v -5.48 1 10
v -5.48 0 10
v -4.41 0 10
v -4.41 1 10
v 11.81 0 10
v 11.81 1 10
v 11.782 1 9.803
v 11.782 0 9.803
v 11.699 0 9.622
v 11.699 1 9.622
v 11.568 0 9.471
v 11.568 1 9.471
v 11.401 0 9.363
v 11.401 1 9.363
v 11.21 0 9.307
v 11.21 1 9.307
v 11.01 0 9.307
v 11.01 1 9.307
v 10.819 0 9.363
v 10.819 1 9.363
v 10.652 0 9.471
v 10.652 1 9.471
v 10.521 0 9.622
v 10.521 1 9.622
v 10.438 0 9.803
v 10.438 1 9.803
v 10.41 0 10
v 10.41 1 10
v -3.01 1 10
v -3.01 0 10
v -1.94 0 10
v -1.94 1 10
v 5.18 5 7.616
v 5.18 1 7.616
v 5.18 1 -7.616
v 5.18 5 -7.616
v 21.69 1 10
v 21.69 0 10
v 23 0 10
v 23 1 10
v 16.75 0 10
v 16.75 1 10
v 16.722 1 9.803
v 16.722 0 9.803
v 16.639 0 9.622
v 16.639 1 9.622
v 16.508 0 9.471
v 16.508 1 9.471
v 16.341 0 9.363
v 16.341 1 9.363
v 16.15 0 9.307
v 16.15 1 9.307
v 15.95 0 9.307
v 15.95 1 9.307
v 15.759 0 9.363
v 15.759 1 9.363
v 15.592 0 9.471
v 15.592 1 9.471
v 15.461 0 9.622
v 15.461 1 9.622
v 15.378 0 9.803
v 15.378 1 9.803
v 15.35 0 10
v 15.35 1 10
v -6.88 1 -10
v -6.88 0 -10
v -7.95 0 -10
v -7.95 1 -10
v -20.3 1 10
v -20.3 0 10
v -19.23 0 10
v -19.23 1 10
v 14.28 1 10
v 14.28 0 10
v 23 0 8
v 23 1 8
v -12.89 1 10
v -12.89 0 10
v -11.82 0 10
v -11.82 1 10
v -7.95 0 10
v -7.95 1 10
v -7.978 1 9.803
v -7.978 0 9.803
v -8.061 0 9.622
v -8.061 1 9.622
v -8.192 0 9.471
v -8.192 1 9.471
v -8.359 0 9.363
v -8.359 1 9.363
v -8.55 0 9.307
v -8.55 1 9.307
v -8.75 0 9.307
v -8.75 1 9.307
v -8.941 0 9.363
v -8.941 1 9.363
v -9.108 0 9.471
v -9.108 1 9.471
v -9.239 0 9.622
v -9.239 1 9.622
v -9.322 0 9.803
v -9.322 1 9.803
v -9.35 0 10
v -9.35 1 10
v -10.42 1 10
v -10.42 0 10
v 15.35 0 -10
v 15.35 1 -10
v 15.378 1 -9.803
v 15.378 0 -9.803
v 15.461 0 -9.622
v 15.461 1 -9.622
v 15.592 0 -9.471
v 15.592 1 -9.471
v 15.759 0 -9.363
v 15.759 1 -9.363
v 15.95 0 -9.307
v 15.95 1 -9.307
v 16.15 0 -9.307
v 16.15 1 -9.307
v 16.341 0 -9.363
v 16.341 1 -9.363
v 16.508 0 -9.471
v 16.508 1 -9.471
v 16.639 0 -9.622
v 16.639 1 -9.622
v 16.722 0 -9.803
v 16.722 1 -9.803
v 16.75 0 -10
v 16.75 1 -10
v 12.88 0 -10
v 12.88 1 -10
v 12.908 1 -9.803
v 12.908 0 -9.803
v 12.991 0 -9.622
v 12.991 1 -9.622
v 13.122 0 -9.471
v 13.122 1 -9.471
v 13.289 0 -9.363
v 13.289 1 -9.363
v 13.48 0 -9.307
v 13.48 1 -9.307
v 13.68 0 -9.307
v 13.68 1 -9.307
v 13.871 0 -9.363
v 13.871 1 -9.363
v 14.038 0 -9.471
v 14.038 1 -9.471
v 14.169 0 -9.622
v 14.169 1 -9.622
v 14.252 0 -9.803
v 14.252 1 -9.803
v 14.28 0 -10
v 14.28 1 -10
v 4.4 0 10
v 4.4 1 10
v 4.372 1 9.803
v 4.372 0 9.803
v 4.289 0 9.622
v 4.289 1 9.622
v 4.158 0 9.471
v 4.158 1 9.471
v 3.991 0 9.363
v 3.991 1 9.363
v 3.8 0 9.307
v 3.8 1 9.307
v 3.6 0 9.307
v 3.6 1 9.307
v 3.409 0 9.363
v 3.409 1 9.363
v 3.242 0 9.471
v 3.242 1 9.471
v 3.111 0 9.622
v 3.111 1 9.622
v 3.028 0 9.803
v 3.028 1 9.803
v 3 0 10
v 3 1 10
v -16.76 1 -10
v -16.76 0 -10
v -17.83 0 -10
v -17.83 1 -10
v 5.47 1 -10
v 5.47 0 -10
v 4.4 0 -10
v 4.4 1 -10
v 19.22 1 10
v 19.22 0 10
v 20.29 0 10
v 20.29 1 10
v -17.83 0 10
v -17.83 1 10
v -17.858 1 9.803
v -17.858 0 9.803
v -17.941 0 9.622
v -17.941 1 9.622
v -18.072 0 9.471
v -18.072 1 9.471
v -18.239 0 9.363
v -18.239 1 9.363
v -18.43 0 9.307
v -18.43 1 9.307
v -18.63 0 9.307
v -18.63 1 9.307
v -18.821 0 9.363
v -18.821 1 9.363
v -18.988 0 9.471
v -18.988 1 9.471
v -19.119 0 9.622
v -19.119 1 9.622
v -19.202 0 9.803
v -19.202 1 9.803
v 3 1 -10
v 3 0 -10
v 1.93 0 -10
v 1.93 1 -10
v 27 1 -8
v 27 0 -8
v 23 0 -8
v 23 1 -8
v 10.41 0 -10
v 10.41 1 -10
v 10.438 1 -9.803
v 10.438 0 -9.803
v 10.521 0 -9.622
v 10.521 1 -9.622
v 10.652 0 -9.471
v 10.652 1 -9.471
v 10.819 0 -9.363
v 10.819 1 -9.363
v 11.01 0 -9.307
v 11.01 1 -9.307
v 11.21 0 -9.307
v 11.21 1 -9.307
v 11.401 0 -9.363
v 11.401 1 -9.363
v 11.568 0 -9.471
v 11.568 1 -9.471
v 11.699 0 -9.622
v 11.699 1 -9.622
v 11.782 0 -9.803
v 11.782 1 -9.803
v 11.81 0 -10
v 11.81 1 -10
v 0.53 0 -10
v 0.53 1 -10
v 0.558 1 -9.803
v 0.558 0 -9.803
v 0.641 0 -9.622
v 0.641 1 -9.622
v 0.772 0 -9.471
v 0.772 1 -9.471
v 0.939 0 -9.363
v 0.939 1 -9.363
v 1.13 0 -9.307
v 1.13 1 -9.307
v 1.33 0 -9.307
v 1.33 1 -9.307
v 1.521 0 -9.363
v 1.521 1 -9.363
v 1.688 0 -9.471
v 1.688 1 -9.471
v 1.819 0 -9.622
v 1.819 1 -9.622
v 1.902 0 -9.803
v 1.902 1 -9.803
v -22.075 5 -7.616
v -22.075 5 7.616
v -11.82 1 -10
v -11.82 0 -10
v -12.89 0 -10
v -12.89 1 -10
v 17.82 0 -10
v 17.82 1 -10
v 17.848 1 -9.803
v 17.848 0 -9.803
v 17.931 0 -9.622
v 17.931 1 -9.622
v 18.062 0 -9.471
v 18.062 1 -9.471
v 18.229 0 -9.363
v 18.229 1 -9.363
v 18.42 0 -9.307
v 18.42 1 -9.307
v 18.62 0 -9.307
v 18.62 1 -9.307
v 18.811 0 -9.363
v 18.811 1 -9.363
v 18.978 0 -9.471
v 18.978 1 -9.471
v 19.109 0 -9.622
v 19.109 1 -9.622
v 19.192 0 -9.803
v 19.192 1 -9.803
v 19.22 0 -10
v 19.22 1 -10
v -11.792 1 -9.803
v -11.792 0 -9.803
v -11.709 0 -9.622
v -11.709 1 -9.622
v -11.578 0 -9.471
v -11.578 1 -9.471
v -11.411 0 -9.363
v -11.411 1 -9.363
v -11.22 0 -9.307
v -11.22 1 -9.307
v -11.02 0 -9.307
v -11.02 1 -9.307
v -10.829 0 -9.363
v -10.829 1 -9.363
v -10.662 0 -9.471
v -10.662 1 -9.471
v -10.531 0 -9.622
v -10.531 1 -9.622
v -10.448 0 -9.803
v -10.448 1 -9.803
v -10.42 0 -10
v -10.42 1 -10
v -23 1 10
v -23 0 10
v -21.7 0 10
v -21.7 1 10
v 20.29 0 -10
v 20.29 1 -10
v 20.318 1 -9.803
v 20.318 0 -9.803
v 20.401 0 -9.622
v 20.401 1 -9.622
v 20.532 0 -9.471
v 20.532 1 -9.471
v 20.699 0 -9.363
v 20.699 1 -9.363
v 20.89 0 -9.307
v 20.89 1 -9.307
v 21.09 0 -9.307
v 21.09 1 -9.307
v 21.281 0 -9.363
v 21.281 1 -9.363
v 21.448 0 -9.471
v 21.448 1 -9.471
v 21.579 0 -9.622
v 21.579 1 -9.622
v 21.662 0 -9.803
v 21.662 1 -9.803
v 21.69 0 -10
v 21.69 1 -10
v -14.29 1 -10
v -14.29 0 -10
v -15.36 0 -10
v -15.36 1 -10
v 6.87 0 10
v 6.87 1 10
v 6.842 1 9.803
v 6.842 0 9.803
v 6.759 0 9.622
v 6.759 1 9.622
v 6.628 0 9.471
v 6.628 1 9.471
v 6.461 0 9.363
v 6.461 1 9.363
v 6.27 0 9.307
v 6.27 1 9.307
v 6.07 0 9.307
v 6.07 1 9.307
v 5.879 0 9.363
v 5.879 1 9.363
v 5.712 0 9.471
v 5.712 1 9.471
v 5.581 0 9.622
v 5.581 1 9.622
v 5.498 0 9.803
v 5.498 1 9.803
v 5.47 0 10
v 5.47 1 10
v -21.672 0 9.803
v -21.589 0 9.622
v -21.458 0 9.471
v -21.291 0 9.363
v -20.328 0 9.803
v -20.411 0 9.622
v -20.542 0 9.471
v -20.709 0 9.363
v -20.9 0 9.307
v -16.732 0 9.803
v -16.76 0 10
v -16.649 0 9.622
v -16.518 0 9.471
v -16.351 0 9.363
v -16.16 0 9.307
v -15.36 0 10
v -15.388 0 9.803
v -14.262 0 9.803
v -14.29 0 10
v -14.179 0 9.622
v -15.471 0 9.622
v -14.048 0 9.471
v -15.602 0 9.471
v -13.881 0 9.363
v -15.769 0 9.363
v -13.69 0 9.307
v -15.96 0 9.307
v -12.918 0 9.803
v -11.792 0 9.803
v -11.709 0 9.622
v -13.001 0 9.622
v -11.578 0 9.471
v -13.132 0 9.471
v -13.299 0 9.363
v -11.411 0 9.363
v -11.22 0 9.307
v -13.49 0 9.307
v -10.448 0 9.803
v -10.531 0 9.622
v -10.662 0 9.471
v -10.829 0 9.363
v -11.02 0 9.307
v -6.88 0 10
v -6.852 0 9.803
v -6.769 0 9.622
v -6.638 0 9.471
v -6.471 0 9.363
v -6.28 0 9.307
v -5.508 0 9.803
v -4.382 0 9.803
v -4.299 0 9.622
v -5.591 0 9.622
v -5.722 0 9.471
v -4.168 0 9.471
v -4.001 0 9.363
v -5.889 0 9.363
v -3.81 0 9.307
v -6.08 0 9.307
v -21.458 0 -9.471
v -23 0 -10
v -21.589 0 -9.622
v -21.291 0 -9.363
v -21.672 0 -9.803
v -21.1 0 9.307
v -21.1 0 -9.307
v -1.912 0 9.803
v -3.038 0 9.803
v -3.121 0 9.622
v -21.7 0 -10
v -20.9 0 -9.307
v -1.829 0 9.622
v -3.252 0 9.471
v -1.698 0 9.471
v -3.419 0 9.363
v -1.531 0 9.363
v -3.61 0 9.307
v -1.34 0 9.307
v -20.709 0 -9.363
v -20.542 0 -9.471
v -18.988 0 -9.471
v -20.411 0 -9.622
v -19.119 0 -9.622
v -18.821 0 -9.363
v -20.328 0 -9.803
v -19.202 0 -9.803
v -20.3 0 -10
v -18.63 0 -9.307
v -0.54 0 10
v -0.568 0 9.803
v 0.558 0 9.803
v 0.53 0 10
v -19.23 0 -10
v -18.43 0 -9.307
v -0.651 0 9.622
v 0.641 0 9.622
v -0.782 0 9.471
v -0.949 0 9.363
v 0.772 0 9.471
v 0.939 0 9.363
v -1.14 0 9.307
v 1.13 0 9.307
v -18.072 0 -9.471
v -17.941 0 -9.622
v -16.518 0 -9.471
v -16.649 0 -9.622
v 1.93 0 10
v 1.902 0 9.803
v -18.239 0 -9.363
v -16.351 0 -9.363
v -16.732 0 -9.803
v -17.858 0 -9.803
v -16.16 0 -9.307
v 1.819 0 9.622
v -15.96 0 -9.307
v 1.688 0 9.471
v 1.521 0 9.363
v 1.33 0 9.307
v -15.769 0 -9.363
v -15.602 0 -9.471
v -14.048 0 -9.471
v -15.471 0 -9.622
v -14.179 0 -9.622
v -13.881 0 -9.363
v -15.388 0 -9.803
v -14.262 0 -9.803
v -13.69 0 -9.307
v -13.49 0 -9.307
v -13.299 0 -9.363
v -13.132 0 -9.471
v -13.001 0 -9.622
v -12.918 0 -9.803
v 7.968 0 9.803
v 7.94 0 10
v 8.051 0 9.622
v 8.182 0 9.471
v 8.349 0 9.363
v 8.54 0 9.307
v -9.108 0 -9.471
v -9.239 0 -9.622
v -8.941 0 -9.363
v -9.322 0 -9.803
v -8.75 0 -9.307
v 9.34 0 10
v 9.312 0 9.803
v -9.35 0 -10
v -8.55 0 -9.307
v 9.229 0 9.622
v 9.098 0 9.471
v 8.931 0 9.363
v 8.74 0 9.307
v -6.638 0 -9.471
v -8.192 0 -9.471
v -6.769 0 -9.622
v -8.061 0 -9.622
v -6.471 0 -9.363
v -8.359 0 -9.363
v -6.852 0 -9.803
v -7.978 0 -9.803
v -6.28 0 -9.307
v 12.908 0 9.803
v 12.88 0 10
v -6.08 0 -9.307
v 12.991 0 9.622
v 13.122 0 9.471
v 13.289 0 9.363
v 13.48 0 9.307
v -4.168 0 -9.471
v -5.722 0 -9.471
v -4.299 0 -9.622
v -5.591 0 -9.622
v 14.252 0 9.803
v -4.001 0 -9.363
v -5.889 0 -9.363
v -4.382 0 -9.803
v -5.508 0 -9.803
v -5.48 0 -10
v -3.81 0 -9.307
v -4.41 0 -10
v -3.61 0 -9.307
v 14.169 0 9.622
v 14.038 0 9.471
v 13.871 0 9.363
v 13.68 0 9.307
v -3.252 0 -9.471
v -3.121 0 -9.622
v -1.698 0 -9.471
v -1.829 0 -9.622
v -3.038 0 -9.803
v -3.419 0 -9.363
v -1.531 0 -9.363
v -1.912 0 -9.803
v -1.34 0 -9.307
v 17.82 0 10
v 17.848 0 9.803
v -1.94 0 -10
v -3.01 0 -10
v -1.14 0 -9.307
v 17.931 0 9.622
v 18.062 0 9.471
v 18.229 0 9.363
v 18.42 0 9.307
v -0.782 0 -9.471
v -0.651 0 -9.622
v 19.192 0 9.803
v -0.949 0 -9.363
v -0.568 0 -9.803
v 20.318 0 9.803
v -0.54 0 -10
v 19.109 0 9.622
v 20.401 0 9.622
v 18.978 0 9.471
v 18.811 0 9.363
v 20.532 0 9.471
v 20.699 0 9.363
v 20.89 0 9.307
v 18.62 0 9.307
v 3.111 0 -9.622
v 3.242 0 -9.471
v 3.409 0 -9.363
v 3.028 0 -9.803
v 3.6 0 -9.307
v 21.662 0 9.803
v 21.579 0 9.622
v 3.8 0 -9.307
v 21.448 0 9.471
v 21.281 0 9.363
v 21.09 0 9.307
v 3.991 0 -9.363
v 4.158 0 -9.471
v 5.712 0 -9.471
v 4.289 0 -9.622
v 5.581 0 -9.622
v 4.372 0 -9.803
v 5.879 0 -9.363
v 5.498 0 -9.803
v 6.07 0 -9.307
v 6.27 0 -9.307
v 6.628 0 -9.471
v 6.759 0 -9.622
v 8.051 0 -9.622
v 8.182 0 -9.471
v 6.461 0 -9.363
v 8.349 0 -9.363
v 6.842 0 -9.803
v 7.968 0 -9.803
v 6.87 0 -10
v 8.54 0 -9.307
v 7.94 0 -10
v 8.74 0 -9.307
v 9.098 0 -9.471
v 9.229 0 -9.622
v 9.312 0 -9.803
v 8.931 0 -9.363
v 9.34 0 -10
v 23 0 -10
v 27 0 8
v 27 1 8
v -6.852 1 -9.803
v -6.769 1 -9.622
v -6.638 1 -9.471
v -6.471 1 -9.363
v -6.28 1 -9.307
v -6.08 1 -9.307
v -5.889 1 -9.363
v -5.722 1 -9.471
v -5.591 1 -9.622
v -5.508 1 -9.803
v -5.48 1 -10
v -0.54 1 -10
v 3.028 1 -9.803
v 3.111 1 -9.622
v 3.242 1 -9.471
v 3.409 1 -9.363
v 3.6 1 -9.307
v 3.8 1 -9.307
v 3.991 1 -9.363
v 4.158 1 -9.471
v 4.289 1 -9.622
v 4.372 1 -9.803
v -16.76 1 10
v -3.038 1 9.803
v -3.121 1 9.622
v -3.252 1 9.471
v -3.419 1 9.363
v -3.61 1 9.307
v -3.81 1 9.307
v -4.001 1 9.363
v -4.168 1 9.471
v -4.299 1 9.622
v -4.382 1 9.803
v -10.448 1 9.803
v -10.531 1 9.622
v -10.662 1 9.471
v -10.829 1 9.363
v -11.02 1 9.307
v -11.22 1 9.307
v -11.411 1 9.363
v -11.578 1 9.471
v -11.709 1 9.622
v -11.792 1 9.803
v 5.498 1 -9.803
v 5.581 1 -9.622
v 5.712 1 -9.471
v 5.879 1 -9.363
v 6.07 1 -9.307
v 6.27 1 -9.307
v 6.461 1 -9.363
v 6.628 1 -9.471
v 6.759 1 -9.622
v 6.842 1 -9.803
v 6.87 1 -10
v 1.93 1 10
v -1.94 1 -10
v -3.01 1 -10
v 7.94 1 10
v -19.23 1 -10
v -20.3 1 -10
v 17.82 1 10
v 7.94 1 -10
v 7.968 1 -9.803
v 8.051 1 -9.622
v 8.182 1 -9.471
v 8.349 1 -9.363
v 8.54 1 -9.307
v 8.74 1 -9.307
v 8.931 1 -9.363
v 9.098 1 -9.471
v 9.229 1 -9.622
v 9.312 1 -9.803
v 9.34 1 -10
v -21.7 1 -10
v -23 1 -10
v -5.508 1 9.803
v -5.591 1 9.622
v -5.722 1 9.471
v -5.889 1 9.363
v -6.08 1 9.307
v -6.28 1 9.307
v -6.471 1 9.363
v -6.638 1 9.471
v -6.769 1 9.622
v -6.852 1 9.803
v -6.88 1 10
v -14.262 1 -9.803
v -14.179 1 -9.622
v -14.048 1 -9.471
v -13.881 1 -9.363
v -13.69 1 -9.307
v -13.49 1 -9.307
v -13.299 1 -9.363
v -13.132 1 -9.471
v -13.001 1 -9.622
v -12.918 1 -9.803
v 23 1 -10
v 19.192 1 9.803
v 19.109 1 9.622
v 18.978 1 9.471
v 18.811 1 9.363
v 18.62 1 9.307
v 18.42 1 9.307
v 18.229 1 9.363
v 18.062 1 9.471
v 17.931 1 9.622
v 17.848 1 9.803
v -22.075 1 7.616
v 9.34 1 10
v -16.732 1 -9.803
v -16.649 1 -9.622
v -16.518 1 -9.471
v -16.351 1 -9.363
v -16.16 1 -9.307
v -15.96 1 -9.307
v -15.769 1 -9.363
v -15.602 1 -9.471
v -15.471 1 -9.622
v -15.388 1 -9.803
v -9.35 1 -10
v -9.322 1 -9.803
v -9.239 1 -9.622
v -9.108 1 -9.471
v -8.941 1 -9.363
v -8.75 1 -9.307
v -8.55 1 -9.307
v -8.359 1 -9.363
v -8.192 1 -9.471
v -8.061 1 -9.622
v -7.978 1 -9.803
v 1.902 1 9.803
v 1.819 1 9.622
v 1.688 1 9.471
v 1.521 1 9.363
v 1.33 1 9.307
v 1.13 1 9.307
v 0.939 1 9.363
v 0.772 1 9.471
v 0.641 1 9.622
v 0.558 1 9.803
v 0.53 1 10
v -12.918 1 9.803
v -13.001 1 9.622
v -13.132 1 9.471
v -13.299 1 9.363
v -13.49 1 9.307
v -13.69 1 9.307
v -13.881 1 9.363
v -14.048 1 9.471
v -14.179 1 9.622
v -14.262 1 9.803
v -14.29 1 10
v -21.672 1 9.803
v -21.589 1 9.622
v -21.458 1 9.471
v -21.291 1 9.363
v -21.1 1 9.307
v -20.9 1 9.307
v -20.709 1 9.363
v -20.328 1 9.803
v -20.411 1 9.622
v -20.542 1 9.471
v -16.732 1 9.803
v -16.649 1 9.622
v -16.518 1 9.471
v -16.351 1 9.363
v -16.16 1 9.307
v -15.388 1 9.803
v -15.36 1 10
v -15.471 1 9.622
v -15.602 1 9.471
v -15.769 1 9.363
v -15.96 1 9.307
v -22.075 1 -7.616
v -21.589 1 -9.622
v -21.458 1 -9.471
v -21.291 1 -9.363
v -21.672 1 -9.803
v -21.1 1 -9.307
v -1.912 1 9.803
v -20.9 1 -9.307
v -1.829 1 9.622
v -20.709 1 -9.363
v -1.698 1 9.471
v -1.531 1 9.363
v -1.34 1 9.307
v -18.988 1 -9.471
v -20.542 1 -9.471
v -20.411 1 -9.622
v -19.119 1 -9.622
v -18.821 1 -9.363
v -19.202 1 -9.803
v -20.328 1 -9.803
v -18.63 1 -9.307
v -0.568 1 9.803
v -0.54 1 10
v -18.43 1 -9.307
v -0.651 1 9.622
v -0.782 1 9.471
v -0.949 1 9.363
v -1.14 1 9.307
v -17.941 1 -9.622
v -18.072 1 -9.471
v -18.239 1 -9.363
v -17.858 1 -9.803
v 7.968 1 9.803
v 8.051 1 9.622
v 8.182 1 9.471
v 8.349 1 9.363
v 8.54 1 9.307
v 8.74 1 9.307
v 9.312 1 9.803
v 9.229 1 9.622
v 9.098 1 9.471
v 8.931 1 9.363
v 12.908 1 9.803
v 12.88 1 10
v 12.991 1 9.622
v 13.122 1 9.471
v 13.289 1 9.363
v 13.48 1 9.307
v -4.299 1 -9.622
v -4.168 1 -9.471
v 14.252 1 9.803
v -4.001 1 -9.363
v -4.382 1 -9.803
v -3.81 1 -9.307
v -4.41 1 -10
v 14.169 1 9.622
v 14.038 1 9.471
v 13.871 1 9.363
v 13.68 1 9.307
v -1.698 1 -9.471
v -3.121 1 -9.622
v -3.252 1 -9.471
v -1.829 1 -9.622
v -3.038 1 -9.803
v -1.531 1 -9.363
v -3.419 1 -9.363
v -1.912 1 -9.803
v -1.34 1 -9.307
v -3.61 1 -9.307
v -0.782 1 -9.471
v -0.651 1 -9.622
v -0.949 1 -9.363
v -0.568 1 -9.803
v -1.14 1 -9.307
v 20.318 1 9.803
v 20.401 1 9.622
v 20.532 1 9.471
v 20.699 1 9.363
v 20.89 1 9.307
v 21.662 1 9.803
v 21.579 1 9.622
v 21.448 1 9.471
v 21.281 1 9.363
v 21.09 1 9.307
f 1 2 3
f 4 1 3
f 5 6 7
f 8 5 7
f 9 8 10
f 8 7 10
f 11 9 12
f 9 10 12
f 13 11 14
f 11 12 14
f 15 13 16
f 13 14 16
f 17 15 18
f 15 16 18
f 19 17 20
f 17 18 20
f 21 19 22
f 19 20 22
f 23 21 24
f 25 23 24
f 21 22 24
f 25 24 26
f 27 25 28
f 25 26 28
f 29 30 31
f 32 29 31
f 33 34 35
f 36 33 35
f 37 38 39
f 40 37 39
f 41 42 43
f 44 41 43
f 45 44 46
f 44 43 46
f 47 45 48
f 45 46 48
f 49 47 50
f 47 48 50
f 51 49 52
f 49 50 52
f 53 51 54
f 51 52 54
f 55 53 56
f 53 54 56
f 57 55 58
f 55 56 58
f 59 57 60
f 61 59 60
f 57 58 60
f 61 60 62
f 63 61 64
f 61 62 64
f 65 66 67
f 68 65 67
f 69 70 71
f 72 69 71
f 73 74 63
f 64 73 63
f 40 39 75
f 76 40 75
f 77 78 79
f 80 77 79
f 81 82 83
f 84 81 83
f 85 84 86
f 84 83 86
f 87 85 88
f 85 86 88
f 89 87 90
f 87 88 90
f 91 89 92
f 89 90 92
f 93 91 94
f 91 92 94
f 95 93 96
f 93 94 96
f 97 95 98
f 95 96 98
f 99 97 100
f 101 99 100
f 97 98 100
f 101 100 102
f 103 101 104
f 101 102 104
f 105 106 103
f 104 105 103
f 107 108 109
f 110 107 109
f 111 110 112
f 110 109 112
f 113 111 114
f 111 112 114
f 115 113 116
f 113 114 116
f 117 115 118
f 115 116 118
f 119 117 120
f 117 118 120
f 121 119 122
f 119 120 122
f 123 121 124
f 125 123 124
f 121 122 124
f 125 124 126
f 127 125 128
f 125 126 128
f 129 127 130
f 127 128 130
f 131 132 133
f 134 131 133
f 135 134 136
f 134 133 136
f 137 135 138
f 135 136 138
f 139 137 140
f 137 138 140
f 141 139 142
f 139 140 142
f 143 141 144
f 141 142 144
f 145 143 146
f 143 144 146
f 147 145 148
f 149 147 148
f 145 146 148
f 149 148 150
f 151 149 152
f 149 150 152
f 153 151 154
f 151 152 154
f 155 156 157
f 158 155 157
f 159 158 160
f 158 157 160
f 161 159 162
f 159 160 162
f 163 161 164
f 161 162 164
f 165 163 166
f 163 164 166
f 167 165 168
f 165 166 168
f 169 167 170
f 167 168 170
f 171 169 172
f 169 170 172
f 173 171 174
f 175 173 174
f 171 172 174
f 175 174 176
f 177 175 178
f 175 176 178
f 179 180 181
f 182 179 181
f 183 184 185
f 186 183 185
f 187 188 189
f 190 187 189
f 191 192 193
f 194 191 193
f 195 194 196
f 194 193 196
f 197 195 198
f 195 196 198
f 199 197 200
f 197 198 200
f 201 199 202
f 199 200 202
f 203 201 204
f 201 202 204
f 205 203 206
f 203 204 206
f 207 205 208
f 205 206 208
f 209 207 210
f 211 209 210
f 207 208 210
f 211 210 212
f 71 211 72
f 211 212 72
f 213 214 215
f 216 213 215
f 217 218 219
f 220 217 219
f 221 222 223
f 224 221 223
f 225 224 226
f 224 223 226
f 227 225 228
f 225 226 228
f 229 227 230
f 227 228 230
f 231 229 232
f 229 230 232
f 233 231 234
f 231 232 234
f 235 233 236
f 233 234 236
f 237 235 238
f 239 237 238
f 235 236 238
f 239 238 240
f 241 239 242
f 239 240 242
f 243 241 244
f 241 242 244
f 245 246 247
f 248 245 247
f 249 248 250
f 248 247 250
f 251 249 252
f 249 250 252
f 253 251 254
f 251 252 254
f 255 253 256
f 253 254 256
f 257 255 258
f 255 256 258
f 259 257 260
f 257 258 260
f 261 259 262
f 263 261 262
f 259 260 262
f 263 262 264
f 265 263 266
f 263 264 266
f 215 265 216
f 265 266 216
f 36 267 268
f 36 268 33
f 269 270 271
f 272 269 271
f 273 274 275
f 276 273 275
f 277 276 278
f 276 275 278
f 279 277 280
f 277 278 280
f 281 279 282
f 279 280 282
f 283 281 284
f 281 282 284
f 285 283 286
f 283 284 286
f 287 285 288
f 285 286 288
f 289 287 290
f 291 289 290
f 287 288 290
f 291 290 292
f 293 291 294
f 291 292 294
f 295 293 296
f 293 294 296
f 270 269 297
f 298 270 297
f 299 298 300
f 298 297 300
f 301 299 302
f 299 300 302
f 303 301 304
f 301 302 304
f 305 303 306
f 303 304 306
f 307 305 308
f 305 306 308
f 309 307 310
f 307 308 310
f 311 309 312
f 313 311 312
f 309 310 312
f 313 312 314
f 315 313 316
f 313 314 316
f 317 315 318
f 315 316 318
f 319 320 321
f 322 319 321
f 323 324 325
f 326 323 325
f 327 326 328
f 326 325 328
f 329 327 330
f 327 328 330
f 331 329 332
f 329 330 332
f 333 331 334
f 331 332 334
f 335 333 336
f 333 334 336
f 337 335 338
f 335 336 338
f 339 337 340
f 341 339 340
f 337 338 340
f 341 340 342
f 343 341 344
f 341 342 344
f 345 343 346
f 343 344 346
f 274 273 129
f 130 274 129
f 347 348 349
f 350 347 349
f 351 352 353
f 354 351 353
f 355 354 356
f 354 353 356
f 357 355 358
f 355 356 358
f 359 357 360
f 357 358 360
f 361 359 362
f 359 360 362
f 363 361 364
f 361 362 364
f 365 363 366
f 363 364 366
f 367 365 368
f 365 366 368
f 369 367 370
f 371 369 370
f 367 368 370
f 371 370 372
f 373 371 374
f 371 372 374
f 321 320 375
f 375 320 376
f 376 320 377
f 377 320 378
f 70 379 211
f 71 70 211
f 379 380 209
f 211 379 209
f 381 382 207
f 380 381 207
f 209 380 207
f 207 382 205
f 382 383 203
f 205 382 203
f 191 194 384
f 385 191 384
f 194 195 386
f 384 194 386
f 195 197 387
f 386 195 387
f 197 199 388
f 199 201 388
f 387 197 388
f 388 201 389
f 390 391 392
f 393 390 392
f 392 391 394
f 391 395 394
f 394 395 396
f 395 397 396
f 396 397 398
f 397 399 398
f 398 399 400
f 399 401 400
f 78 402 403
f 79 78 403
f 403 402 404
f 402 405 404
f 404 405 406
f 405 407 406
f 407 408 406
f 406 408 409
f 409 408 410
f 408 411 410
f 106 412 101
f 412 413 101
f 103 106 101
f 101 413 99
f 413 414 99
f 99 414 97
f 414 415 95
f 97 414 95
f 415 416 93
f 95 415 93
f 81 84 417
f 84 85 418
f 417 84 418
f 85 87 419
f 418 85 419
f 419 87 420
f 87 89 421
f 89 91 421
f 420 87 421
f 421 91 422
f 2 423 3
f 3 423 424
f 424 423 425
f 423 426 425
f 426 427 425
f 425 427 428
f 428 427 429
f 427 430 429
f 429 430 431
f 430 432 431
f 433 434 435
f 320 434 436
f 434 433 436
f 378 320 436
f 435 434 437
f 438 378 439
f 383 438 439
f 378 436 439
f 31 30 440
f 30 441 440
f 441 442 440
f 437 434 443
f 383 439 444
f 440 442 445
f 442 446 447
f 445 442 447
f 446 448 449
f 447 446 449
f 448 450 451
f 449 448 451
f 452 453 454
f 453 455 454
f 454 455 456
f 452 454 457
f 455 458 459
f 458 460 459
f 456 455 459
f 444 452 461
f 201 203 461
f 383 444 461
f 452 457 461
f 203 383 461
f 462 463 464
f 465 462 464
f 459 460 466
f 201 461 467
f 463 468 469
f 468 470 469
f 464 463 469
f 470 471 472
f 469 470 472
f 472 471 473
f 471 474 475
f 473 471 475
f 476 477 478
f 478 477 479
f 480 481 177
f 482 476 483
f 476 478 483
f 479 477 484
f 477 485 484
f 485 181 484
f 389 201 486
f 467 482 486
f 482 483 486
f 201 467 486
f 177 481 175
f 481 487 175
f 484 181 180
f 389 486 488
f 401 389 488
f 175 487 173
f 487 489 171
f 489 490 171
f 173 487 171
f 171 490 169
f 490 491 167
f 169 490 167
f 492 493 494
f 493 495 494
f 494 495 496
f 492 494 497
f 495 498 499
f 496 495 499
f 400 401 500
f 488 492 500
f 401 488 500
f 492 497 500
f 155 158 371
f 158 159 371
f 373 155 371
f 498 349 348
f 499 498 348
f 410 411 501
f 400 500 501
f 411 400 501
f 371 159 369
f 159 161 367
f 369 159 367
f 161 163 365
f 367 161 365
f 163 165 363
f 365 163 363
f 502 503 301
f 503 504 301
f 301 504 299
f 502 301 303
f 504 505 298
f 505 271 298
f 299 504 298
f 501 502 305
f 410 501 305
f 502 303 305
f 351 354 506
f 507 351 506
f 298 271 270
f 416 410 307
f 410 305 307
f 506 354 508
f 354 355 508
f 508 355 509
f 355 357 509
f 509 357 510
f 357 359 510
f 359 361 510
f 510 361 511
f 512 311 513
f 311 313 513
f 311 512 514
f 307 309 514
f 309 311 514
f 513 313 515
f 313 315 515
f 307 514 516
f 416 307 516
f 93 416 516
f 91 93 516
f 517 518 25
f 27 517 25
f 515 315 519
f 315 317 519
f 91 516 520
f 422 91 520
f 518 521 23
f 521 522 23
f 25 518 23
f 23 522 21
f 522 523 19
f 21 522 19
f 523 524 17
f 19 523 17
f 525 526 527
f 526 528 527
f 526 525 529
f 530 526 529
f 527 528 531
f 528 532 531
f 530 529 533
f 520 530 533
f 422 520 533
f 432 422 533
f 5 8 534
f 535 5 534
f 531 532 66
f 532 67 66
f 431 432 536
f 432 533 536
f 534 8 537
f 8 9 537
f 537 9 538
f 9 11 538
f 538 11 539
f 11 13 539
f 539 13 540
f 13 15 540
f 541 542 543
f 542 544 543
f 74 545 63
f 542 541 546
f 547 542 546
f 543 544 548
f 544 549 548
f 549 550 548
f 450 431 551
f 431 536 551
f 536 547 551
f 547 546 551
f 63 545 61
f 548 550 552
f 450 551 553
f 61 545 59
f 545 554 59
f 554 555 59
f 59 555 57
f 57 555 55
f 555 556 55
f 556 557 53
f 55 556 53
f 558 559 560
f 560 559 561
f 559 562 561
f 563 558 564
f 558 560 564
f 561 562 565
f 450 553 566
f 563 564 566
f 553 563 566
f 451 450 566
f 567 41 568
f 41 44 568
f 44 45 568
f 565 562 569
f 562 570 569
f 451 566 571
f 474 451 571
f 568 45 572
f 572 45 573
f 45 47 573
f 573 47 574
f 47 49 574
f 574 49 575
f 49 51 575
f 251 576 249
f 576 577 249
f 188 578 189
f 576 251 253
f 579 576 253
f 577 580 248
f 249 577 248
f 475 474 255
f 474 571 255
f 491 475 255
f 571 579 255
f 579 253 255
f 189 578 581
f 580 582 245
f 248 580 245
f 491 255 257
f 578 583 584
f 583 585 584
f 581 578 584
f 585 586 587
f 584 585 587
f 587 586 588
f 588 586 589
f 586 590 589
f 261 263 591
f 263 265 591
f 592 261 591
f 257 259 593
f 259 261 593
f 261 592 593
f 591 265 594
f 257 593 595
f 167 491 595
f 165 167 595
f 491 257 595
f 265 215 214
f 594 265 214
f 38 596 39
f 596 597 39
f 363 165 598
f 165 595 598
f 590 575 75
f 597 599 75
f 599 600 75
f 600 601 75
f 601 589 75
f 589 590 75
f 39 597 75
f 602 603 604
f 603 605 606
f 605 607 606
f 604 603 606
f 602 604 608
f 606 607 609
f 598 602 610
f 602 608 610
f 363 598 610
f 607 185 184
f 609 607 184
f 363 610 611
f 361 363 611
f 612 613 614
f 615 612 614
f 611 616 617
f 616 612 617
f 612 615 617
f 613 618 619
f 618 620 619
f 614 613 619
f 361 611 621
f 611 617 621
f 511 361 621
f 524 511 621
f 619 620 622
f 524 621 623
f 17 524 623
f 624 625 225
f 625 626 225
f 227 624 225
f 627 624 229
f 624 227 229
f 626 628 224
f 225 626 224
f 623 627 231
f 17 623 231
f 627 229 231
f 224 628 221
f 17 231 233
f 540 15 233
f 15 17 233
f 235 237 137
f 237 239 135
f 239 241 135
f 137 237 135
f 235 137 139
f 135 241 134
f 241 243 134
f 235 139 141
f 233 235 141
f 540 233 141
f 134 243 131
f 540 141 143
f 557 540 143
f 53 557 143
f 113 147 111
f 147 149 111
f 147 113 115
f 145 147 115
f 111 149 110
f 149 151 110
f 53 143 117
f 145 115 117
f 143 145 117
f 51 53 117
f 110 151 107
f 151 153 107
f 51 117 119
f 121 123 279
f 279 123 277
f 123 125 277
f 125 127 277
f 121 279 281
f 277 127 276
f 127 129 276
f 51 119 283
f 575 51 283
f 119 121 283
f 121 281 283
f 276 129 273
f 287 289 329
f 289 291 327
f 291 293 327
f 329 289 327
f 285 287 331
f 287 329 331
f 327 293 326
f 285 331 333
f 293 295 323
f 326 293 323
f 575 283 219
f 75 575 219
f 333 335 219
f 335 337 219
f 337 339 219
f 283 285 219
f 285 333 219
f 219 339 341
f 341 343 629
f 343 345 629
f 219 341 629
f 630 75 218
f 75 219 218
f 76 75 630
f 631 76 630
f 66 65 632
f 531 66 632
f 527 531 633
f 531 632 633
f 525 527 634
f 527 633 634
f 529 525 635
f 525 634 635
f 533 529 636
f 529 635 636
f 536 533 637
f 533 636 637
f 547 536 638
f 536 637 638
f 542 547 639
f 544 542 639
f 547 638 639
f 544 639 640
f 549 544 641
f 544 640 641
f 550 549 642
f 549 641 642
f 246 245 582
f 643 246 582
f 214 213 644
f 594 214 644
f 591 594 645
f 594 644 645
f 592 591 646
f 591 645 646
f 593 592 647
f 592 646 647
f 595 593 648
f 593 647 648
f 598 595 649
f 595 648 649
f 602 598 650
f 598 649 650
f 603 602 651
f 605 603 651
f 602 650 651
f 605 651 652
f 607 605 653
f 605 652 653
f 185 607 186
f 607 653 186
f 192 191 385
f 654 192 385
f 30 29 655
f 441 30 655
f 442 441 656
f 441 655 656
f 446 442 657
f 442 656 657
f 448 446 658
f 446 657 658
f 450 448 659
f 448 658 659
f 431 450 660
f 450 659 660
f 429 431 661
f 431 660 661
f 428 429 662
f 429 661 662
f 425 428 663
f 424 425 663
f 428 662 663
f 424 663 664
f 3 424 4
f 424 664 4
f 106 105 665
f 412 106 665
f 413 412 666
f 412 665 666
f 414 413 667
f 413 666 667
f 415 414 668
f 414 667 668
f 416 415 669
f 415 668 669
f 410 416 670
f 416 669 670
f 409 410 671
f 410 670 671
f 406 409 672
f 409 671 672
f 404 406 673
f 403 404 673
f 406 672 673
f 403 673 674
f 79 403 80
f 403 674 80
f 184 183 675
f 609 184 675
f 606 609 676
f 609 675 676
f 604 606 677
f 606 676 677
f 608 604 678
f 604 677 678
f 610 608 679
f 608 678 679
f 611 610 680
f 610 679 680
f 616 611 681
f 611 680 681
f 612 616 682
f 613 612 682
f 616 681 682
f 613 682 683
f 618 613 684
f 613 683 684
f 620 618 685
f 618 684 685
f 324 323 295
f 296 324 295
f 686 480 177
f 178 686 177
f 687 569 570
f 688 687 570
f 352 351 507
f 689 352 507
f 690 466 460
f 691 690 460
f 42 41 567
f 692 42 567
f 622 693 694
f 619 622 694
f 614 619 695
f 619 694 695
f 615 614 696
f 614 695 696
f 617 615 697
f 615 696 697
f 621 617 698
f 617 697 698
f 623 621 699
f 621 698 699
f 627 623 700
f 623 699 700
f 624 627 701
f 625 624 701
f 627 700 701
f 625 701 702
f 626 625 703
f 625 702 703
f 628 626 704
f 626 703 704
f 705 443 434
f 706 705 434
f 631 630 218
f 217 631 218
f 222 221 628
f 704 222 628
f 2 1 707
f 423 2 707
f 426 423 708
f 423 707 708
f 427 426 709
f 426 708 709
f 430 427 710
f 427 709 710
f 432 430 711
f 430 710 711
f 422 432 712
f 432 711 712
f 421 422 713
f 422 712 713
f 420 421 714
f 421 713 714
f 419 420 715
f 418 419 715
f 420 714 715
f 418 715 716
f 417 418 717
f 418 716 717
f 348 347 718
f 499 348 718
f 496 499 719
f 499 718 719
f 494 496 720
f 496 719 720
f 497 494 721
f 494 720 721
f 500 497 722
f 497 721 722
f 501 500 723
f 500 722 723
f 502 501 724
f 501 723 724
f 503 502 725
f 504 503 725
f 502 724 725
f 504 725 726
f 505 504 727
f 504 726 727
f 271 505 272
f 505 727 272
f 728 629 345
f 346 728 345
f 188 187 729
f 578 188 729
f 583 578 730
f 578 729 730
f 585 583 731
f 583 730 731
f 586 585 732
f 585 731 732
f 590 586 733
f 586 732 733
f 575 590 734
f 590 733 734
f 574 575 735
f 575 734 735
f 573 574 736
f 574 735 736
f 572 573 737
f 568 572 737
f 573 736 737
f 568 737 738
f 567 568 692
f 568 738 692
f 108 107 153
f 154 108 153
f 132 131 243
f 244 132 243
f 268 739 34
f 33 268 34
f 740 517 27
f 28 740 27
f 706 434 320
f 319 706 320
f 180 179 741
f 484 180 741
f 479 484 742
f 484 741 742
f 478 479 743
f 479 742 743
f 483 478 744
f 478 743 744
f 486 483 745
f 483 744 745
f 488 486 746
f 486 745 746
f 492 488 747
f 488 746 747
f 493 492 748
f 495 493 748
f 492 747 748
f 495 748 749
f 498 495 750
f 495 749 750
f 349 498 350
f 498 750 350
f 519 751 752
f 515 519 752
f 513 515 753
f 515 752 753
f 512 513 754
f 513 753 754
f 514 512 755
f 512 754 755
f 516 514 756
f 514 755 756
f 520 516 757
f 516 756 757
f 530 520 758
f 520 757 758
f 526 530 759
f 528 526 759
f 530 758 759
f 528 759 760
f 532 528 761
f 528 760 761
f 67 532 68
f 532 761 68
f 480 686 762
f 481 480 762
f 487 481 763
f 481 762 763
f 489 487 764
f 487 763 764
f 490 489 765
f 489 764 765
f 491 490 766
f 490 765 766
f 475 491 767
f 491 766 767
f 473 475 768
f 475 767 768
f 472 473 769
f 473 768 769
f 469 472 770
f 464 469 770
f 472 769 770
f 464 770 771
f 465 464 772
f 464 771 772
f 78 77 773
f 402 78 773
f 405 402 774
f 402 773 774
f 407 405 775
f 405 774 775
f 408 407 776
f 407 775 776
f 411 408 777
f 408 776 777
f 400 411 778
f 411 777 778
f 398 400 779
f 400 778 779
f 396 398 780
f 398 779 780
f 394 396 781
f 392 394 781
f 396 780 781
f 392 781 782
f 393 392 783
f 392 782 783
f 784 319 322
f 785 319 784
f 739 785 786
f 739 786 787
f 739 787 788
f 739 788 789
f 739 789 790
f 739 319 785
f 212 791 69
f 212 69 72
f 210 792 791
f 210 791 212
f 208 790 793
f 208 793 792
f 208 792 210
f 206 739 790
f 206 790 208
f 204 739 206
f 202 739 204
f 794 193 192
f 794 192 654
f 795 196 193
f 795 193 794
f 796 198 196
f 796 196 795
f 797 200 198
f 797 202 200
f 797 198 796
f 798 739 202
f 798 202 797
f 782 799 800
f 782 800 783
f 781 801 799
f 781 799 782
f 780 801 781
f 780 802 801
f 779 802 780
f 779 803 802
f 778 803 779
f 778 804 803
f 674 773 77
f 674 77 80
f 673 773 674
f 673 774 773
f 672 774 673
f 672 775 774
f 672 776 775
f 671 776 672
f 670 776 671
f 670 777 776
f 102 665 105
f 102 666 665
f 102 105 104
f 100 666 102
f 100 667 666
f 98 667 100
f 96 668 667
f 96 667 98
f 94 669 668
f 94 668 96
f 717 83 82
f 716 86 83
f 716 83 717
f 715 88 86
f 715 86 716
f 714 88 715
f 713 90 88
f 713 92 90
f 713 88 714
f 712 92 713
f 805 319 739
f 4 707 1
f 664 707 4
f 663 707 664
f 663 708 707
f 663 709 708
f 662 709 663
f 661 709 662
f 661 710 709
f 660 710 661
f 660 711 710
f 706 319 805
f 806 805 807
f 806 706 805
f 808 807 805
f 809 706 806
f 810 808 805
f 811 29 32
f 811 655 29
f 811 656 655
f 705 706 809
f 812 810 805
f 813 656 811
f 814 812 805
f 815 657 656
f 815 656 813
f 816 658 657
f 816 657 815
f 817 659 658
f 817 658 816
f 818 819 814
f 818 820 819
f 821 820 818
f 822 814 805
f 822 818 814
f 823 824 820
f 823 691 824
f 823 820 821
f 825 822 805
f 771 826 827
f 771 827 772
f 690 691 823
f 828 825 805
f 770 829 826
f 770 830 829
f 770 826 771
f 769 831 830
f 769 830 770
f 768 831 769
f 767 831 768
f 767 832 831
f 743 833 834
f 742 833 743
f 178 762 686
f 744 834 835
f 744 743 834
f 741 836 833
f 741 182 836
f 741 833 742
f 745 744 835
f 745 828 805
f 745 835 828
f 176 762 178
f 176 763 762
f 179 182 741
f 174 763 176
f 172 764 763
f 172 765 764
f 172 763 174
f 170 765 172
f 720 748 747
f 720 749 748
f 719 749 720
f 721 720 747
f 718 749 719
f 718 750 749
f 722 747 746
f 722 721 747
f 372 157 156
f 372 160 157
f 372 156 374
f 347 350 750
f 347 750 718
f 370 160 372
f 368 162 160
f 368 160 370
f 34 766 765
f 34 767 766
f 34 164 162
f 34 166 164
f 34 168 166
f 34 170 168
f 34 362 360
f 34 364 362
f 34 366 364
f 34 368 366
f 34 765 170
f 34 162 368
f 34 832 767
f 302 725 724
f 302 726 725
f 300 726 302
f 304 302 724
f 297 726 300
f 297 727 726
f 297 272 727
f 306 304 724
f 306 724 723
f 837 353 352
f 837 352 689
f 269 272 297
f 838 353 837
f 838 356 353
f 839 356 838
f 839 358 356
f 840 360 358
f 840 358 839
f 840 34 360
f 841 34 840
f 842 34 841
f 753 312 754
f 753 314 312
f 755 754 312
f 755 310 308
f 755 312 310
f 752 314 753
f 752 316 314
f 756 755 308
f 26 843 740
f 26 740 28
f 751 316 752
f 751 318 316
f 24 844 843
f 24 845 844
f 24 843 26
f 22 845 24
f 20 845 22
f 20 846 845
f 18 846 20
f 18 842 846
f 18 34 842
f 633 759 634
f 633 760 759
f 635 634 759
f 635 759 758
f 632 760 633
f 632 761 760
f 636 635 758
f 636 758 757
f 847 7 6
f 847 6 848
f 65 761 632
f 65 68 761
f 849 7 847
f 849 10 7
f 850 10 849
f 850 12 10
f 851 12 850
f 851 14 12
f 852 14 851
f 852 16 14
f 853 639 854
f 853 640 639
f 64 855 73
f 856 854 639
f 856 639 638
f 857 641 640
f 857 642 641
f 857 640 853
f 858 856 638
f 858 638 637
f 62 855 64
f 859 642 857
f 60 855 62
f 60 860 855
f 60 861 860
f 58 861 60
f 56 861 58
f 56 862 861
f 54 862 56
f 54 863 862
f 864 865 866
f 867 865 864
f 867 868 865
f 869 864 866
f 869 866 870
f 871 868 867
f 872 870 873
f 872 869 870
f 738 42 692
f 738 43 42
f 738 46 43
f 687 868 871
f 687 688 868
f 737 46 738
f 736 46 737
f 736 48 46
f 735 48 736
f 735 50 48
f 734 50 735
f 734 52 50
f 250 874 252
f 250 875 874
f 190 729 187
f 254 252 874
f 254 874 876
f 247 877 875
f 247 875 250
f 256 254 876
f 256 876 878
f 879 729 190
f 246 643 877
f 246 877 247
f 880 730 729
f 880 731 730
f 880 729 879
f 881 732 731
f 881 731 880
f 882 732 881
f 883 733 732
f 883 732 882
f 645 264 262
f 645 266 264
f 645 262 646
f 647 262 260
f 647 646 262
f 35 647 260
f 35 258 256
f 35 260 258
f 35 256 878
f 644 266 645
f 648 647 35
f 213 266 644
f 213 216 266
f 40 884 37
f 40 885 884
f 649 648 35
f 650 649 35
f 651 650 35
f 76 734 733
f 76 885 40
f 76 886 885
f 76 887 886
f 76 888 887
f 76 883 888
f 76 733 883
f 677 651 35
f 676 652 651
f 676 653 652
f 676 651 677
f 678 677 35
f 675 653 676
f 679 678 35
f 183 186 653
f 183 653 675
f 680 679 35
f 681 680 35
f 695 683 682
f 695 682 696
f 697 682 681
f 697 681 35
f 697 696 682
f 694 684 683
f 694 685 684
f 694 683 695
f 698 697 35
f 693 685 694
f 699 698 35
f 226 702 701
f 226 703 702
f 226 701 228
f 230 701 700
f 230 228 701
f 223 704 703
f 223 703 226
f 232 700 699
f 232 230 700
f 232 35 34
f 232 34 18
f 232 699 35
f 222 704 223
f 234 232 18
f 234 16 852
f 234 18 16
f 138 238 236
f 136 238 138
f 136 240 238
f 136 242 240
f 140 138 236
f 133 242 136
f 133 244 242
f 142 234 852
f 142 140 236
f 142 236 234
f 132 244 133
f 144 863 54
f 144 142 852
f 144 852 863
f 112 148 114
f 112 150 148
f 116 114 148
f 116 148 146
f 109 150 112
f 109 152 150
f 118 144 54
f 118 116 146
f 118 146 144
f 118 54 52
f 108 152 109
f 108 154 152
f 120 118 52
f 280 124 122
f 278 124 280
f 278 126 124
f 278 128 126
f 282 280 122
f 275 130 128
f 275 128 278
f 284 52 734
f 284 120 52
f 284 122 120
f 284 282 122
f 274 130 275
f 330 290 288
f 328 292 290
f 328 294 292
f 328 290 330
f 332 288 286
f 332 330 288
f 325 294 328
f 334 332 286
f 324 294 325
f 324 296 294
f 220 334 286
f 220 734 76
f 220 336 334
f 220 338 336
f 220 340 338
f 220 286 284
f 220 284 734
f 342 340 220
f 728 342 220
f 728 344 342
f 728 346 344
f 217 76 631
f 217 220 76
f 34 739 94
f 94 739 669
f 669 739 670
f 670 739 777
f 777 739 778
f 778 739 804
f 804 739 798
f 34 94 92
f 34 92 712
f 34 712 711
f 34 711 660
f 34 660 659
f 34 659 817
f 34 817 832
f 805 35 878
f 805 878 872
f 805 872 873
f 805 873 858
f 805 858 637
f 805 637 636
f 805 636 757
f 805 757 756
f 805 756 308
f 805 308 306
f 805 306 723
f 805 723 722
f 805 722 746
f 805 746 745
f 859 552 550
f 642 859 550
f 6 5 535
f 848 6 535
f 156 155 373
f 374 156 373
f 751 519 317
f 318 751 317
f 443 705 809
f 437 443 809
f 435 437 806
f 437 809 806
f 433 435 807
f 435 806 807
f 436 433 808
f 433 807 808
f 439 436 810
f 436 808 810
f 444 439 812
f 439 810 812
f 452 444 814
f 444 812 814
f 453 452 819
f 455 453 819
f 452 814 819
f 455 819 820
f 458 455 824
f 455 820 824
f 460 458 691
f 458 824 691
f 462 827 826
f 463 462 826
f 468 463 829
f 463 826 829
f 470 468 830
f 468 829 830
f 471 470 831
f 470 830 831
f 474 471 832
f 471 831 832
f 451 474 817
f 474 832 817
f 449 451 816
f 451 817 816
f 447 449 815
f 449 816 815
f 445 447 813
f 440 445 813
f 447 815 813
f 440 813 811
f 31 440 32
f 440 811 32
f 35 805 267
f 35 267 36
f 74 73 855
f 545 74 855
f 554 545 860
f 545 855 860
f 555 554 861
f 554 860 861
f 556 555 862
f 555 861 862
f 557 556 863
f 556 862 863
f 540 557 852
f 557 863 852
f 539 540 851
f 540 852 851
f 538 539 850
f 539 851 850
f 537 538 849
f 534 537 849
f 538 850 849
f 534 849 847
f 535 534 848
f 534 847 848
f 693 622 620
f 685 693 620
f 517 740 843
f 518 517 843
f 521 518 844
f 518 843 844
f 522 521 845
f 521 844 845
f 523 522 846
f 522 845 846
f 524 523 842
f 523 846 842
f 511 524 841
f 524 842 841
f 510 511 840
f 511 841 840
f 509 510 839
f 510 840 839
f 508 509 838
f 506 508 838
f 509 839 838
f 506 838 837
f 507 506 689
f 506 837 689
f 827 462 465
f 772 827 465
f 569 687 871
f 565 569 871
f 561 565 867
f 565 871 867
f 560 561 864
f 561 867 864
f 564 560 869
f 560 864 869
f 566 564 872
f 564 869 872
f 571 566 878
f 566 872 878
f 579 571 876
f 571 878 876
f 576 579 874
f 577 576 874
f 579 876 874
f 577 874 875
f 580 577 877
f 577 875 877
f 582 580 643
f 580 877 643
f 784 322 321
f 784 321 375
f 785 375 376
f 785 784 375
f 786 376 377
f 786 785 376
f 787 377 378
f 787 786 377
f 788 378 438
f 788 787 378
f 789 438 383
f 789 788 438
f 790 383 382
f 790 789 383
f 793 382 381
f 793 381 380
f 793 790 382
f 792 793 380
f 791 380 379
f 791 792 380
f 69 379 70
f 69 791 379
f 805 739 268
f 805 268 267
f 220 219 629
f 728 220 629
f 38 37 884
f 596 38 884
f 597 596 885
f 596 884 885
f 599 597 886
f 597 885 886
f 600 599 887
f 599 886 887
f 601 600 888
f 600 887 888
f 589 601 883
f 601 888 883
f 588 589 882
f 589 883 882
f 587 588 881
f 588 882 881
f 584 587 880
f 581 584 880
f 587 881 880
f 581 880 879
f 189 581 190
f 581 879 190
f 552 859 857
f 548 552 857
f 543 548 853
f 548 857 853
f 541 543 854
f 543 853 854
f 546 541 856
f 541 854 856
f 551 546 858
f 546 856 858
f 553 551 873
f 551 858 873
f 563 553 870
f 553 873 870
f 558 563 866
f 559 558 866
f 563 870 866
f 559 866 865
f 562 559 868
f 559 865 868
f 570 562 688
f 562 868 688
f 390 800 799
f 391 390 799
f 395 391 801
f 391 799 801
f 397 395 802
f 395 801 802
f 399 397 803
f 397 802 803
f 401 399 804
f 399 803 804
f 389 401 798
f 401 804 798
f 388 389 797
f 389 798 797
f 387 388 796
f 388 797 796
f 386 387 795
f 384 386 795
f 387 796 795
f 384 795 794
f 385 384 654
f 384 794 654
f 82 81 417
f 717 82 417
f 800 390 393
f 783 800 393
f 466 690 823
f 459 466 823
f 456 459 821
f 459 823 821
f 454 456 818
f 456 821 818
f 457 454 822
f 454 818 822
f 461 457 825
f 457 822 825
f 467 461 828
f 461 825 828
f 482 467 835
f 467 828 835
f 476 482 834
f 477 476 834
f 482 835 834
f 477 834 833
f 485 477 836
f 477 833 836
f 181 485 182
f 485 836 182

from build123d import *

# Parameters (mm, degrees)
BOSS_EXTRUDE2_DEPTH      = 1
SKETCH5_R                = 0.7
CUT_EXTRUDE2_DEPTH       = 1
LPATTERN2_COUNT          = 18
LPATTERN2_PITCH          = 2.47
MIRROR1_COPY_1_SKETCH_R  = 0.7
MIRROR1_COPY_1_DEPTH     = 1
MIRROR1_COPY_2_SKETCH_R  = 0.7
MIRROR1_COPY_2_DEPTH     = 1
MIRROR1_COPY_3_SKETCH_R  = 0.7
MIRROR1_COPY_3_DEPTH     = 1
MIRROR1_COPY_4_SKETCH_R  = 0.7
MIRROR1_COPY_4_DEPTH     = 1
MIRROR1_COPY_5_SKETCH_R  = 0.7
MIRROR1_COPY_5_DEPTH     = 1
MIRROR1_COPY_6_SKETCH_R  = 0.7
MIRROR1_COPY_6_DEPTH     = 1
MIRROR1_COPY_7_SKETCH_R  = 0.7
MIRROR1_COPY_7_DEPTH     = 1
MIRROR1_COPY_8_SKETCH_R  = 0.7
MIRROR1_COPY_8_DEPTH     = 1
MIRROR1_COPY_9_SKETCH_R  = 0.7
MIRROR1_COPY_9_DEPTH     = 1
MIRROR1_COPY_10_SKETCH_R = 0.7
MIRROR1_COPY_10_DEPTH    = 1
MIRROR1_COPY_11_SKETCH_R = 0.7
MIRROR1_COPY_11_DEPTH    = 1
MIRROR1_COPY_12_SKETCH_R = 0.7
MIRROR1_COPY_12_DEPTH    = 1
MIRROR1_COPY_13_SKETCH_R = 0.7
MIRROR1_COPY_13_DEPTH    = 1
MIRROR1_COPY_14_SKETCH_R = 0.7
MIRROR1_COPY_14_DEPTH    = 1
MIRROR1_COPY_15_SKETCH_R = 0.7
MIRROR1_COPY_15_DEPTH    = 1
MIRROR1_COPY_16_SKETCH_R = 0.7
MIRROR1_COPY_16_DEPTH    = 1
MIRROR1_COPY_17_SKETCH_R = 0.7
MIRROR1_COPY_17_DEPTH    = 1
SKETCH6_W                = 27.254379167
SKETCH6_H                = 15.23216969
BOSS_EXTRUDE3_DEPTH      = 4


with BuildPart() as part:
    # Sketch4 → Boss-Extrude2 (new body)
    with BuildSketch(Plane(origin=(0, 0, 0), x_dir=(1, 0, 0), z_dir=(0, 1, 0))):
        Polygon((-23, -10), (23, -10), (23, -8), (27, -8), (27, 8), (23, 8), (23, 10), (-23, 10), align=None)
    extrude(amount=BOSS_EXTRUDE2_DEPTH)

    # Sketch5 → Cut-Extrude2 (cut)
    with BuildSketch(Plane(origin=(0, 1, 0), x_dir=(1, 0, 0), z_dir=(0, 1, 0))):
        with Locations((-21, 10)):
            Circle(SKETCH5_R)
    cut_extrude2 = extrude(amount=-CUT_EXTRUDE2_DEPTH, mode=Mode.SUBTRACT)

    # LPattern2: Cut-Extrude2 ×18
    with Locations(*[(i * LPATTERN2_PITCH, 0, 0) for i in range(1, LPATTERN2_COUNT)]):
        add(cut_extrude2, mode=Mode.SUBTRACT)

    # Mirror1: Cut-Extrude2 across plane
    add(cut_extrude2.mirror(Plane.XY), mode=Mode.SUBTRACT)

    # Mirror1 copy 1 sketch → Mirror1 copy 1 (cut)
    with BuildSketch(Plane(origin=(2.47, 1, 0), x_dir=(1, 0, 0), z_dir=(0, 1, 0))):
        with Locations((-21, -10)):
            Circle(MIRROR1_COPY_1_SKETCH_R)
    extrude(amount=-MIRROR1_COPY_1_DEPTH, mode=Mode.SUBTRACT)

    # Mirror1 copy 2 sketch → Mirror1 copy 2 (cut)
    with BuildSketch(Plane(origin=(4.94, 1, 0), x_dir=(1, 0, 0), z_dir=(0, 1, 0))):
        with Locations((-21, -10)):
            Circle(MIRROR1_COPY_2_SKETCH_R)
    extrude(amount=-MIRROR1_COPY_2_DEPTH, mode=Mode.SUBTRACT)

    # Mirror1 copy 3 sketch → Mirror1 copy 3 (cut)
    with BuildSketch(Plane(origin=(7.41, 1, 0), x_dir=(1, 0, 0), z_dir=(0, 1, 0))):
        with Locations((-21, -10)):
            Circle(MIRROR1_COPY_3_SKETCH_R)
    extrude(amount=-MIRROR1_COPY_3_DEPTH, mode=Mode.SUBTRACT)

    # Mirror1 copy 4 sketch → Mirror1 copy 4 (cut)
    with BuildSketch(Plane(origin=(9.88, 1, 0), x_dir=(1, 0, 0), z_dir=(0, 1, 0))):
        with Locations((-21, -10)):
            Circle(MIRROR1_COPY_4_SKETCH_R)
    extrude(amount=-MIRROR1_COPY_4_DEPTH, mode=Mode.SUBTRACT)

    # Mirror1 copy 5 sketch → Mirror1 copy 5 (cut)
    with BuildSketch(Plane(origin=(12.35, 1, 0), x_dir=(1, 0, 0), z_dir=(0, 1, 0))):
        with Locations((-21, -10)):
            Circle(MIRROR1_COPY_5_SKETCH_R)
    extrude(amount=-MIRROR1_COPY_5_DEPTH, mode=Mode.SUBTRACT)

    # Mirror1 copy 6 sketch → Mirror1 copy 6 (cut)
    with BuildSketch(Plane(origin=(14.82, 1, 0), x_dir=(1, 0, 0), z_dir=(0, 1, 0))):
        with Locations((-21, -10)):
            Circle(MIRROR1_COPY_6_SKETCH_R)
    extrude(amount=-MIRROR1_COPY_6_DEPTH, mode=Mode.SUBTRACT)

    # Mirror1 copy 7 sketch → Mirror1 copy 7 (cut)
    with BuildSketch(Plane(origin=(17.29, 1, 0), x_dir=(1, 0, 0), z_dir=(0, 1, 0))):
        with Locations((-21, -10)):
            Circle(MIRROR1_COPY_7_SKETCH_R)
    extrude(amount=-MIRROR1_COPY_7_DEPTH, mode=Mode.SUBTRACT)

    # Mirror1 copy 8 sketch → Mirror1 copy 8 (cut)
    with BuildSketch(Plane(origin=(19.76, 1, 0), x_dir=(1, 0, 0), z_dir=(0, 1, 0))):
        with Locations((-21, -10)):
            Circle(MIRROR1_COPY_8_SKETCH_R)
    extrude(amount=-MIRROR1_COPY_8_DEPTH, mode=Mode.SUBTRACT)

    # Mirror1 copy 9 sketch → Mirror1 copy 9 (cut)
    with BuildSketch(Plane(origin=(22.23, 1, 0), x_dir=(1, 0, 0), z_dir=(0, 1, 0))):
        with Locations((-21, -10)):
            Circle(MIRROR1_COPY_9_SKETCH_R)
    extrude(amount=-MIRROR1_COPY_9_DEPTH, mode=Mode.SUBTRACT)

    # Mirror1 copy 10 sketch → Mirror1 copy 10 (cut)
    with BuildSketch(Plane(origin=(24.7, 1, 0), x_dir=(1, 0, 0), z_dir=(0, 1, 0))):
        with Locations((-21, -10)):
            Circle(MIRROR1_COPY_10_SKETCH_R)
    extrude(amount=-MIRROR1_COPY_10_DEPTH, mode=Mode.SUBTRACT)

    # Mirror1 copy 11 sketch → Mirror1 copy 11 (cut)
    with BuildSketch(Plane(origin=(27.17, 1, 0), x_dir=(1, 0, 0), z_dir=(0, 1, 0))):
        with Locations((-21, -10)):
            Circle(MIRROR1_COPY_11_SKETCH_R)
    extrude(amount=-MIRROR1_COPY_11_DEPTH, mode=Mode.SUBTRACT)

    # Mirror1 copy 12 sketch → Mirror1 copy 12 (cut)
    with BuildSketch(Plane(origin=(29.64, 1, 0), x_dir=(1, 0, 0), z_dir=(0, 1, 0))):
        with Locations((-21, -10)):
            Circle(MIRROR1_COPY_12_SKETCH_R)
    extrude(amount=-MIRROR1_COPY_12_DEPTH, mode=Mode.SUBTRACT)

    # Mirror1 copy 13 sketch → Mirror1 copy 13 (cut)
    with BuildSketch(Plane(origin=(32.11, 1, 0), x_dir=(1, 0, 0), z_dir=(0, 1, 0))):
        with Locations((-21, -10)):
            Circle(MIRROR1_COPY_13_SKETCH_R)
    extrude(amount=-MIRROR1_COPY_13_DEPTH, mode=Mode.SUBTRACT)

    # Mirror1 copy 14 sketch → Mirror1 copy 14 (cut)
    with BuildSketch(Plane(origin=(34.58, 1, 0), x_dir=(1, 0, 0), z_dir=(0, 1, 0))):
        with Locations((-21, -10)):
            Circle(MIRROR1_COPY_14_SKETCH_R)
    extrude(amount=-MIRROR1_COPY_14_DEPTH, mode=Mode.SUBTRACT)

    # Mirror1 copy 15 sketch → Mirror1 copy 15 (cut)
    with BuildSketch(Plane(origin=(37.05, 1, 0), x_dir=(1, 0, 0), z_dir=(0, 1, 0))):
        with Locations((-21, -10)):
            Circle(MIRROR1_COPY_15_SKETCH_R)
    extrude(amount=-MIRROR1_COPY_15_DEPTH, mode=Mode.SUBTRACT)

    # Mirror1 copy 16 sketch → Mirror1 copy 16 (cut)
    with BuildSketch(Plane(origin=(39.52, 1, 0), x_dir=(1, 0, 0), z_dir=(0, 1, 0))):
        with Locations((-21, -10)):
            Circle(MIRROR1_COPY_16_SKETCH_R)
    extrude(amount=-MIRROR1_COPY_16_DEPTH, mode=Mode.SUBTRACT)

    # Mirror1 copy 17 sketch → Mirror1 copy 17 (cut)
    with BuildSketch(Plane(origin=(41.99, 1, 0), x_dir=(1, 0, 0), z_dir=(0, 1, 0))):
        with Locations((-21, -10)):
            Circle(MIRROR1_COPY_17_SKETCH_R)
    extrude(amount=-MIRROR1_COPY_17_DEPTH, mode=Mode.SUBTRACT)

    # Sketch6 → Boss-Extrude3 (add)
    with BuildSketch(Plane(origin=(0, 1, 0), x_dir=(1, 0, 0), z_dir=(0, 1, 0))):
        with Locations((-8.447512014, 0)):
            Rectangle(SKETCH6_W, SKETCH6_H)
    extrude(amount=BOSS_EXTRUDE3_DEPTH)


solid = part.part
